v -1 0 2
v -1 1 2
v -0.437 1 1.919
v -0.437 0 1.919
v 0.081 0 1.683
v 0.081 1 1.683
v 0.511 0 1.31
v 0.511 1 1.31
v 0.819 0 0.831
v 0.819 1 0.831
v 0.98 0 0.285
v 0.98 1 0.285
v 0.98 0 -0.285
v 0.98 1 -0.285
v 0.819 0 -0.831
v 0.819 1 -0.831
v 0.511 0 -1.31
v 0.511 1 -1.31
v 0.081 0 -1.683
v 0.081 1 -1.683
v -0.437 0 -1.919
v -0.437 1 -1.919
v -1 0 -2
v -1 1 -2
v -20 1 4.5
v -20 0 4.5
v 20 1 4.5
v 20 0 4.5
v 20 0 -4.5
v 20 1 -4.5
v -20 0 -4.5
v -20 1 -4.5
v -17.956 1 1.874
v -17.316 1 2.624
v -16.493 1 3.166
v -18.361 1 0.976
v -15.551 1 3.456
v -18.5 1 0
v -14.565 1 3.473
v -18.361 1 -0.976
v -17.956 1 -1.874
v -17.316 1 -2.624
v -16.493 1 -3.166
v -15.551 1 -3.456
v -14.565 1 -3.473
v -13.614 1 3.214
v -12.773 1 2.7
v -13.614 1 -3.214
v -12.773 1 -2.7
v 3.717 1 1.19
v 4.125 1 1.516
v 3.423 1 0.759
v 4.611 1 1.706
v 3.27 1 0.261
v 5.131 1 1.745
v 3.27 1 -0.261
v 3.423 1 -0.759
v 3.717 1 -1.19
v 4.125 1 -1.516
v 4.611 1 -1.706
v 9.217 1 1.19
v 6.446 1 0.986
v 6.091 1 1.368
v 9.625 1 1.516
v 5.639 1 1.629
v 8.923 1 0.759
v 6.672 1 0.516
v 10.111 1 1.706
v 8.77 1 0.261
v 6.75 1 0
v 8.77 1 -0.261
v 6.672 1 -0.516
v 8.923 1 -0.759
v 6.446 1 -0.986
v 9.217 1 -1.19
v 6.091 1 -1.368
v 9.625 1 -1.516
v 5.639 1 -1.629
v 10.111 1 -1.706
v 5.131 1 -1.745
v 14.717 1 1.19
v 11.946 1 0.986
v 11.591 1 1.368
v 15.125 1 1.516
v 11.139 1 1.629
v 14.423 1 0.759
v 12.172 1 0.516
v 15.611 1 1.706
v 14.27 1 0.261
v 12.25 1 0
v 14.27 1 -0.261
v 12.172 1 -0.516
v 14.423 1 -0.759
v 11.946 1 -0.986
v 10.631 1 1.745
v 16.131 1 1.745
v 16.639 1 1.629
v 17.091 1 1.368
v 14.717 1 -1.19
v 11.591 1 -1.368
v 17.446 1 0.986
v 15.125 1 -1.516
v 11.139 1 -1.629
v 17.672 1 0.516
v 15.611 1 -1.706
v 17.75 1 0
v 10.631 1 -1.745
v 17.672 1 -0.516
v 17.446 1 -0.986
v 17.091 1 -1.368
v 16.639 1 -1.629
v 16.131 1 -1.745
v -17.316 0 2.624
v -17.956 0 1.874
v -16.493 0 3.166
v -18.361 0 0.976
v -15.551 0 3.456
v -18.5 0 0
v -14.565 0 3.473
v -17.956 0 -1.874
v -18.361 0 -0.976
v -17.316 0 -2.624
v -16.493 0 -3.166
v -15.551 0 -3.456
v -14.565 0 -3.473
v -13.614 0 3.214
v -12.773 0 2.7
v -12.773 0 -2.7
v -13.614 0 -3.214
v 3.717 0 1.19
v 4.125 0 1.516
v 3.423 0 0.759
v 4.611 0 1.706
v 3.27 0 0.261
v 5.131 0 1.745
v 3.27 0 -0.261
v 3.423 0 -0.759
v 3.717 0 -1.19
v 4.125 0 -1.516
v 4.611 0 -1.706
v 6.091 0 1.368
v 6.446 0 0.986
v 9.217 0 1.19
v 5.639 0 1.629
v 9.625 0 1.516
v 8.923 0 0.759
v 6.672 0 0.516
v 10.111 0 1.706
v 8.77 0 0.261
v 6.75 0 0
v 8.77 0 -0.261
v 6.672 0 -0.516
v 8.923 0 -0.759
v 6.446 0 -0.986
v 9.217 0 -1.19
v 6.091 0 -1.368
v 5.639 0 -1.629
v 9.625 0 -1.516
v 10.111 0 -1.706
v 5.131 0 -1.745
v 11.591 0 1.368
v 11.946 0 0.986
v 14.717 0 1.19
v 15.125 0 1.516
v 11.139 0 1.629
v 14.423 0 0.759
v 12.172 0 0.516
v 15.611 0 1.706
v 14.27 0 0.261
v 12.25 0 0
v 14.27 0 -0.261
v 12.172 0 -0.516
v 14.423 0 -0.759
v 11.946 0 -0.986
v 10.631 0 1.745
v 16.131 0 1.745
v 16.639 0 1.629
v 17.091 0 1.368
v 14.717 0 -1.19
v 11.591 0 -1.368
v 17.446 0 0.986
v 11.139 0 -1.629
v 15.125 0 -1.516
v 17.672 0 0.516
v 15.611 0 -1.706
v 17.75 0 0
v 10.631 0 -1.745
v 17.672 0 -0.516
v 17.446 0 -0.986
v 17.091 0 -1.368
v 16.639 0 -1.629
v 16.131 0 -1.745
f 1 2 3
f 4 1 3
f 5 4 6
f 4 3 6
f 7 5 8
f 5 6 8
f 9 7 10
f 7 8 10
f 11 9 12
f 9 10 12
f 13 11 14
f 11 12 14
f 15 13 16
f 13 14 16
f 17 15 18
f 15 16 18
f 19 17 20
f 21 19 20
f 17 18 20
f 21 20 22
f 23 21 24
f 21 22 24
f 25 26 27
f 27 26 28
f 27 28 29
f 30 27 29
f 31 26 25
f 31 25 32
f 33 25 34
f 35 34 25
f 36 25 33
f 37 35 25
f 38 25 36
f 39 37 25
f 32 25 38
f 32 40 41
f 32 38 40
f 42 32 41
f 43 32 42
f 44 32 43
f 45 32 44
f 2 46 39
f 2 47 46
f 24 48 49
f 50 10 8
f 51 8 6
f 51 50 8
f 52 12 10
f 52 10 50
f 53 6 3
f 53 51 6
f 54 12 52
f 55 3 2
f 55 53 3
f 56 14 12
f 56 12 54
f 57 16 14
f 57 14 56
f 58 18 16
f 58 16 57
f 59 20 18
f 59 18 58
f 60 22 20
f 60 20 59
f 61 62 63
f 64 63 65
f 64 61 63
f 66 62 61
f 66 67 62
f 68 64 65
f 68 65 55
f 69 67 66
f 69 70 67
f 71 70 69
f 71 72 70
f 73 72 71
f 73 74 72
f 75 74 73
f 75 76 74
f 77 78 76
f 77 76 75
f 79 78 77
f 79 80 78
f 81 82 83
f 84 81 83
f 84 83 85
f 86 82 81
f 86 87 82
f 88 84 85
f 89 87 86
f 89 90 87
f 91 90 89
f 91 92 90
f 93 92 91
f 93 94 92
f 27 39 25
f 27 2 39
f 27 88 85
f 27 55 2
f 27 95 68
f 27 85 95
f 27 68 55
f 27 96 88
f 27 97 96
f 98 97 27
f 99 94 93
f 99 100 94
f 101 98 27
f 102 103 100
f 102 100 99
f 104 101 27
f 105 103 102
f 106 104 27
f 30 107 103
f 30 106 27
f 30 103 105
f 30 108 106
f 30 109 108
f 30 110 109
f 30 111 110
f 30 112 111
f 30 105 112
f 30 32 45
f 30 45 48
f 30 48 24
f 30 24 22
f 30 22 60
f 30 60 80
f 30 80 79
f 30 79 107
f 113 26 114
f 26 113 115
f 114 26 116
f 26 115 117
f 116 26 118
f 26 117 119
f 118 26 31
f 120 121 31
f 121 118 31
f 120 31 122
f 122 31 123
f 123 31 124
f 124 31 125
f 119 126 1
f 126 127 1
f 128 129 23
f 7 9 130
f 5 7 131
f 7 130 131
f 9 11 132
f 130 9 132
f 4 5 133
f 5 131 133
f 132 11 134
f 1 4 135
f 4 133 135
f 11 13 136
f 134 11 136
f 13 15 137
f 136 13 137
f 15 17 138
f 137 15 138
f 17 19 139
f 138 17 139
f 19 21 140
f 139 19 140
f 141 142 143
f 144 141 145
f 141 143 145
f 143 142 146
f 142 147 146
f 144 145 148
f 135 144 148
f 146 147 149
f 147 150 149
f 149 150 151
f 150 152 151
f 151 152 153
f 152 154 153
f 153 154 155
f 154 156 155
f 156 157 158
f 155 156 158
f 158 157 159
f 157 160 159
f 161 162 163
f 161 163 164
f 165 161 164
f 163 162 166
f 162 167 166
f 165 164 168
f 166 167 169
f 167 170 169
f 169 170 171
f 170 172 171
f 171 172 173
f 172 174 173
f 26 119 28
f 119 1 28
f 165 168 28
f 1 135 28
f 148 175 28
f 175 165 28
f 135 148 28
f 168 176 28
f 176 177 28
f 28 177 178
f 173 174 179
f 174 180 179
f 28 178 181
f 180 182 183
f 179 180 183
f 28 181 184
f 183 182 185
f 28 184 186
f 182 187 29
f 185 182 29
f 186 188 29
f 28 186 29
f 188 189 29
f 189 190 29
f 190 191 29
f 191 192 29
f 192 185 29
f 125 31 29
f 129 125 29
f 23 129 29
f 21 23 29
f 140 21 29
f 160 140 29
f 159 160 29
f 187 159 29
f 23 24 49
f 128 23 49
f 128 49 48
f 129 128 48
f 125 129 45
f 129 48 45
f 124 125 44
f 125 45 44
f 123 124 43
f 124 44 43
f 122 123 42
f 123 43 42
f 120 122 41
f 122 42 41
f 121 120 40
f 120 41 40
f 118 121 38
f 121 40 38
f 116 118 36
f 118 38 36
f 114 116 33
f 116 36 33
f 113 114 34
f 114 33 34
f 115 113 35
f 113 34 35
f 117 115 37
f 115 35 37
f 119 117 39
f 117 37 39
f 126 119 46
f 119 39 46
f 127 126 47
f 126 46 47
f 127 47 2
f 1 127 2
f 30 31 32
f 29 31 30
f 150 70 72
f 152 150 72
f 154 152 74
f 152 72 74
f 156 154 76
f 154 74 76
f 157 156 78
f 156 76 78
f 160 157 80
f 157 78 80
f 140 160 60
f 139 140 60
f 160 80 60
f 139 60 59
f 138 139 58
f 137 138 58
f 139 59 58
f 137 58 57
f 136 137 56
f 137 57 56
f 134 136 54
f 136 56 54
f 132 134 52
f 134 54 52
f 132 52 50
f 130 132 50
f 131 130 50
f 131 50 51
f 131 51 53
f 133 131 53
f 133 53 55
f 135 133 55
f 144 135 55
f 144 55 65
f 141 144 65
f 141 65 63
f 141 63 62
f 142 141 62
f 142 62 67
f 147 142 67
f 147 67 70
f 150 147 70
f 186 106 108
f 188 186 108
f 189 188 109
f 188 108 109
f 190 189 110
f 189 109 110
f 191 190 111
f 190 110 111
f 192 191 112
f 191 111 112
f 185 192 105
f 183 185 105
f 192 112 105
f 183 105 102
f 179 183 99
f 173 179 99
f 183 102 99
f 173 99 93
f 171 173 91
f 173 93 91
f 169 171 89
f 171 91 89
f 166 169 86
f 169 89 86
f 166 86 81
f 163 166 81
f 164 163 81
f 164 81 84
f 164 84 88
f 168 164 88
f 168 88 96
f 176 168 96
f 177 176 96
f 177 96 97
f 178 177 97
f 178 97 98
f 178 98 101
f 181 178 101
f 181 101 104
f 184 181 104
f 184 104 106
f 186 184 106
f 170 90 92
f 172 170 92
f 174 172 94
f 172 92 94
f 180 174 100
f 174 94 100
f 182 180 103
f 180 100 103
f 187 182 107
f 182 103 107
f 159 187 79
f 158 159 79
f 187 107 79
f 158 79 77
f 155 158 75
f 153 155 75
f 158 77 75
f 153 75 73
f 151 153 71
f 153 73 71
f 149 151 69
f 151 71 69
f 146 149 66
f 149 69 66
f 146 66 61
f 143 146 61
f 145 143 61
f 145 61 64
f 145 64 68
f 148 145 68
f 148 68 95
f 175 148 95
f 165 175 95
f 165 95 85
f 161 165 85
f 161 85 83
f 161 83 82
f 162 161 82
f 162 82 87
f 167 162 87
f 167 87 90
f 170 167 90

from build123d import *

# Parameters (mm, degrees)
SKETCH2_W           = 40
SKETCH2_H           = 9
BOSS_EXTRUDE1_DEPTH = 1
CUT_EXTRUDE1_DEPTH  = 3
SKETCH4_R           = 1.75
CUT_EXTRUDE2_DEPTH  = 3
LPATTERN1_COUNT     = 3
LPATTERN1_PITCH     = 5.5


with BuildPart() as part:
    # Sketch2 → Boss-Extrude1 (new body)
    with BuildSketch(Plane(origin=(0, 0, 0), x_dir=(1, 0, 0), z_dir=(0, 1, 0))):
        Rectangle(SKETCH2_W, SKETCH2_H)
    extrude(amount=BOSS_EXTRUDE1_DEPTH)

    # Sketch3 → Cut-Extrude1 (cut)
    with BuildSketch(Plane(origin=(0, 1, 0), x_dir=(1, 0, 0), z_dir=(0, 1, 0))):
        with BuildLine():
            Line((-12.772894255, -2.7), (-1, -2))
            ThreePointArc((-1, -2), (1, 0), (-1, 2))
            Line((-1, 2), (-12.772894255, 2.7))
            ThreePointArc((-12.772894255, 2.7), (-18.5, 0), (-12.772894255, -2.7))
        make_face()
    extrude(amount=-CUT_EXTRUDE1_DEPTH, mode=Mode.SUBTRACT)

    # Sketch4 → Cut-Extrude2 (cut)
    with BuildSketch(Plane(origin=(0, 1, 0), x_dir=(1, 0, 0), z_dir=(0, 1, 0))):
        with Locations((5, 0)):
            Circle(SKETCH4_R)
    cut_extrude2 = extrude(amount=-CUT_EXTRUDE2_DEPTH, mode=Mode.SUBTRACT)

    # LPattern1: Cut-Extrude2 ×3
    with Locations(*[(i * LPATTERN1_PITCH, 0, 0) for i in range(1, LPATTERN1_COUNT)]):
        add(cut_extrude2, mode=Mode.SUBTRACT)


solid = part.part
